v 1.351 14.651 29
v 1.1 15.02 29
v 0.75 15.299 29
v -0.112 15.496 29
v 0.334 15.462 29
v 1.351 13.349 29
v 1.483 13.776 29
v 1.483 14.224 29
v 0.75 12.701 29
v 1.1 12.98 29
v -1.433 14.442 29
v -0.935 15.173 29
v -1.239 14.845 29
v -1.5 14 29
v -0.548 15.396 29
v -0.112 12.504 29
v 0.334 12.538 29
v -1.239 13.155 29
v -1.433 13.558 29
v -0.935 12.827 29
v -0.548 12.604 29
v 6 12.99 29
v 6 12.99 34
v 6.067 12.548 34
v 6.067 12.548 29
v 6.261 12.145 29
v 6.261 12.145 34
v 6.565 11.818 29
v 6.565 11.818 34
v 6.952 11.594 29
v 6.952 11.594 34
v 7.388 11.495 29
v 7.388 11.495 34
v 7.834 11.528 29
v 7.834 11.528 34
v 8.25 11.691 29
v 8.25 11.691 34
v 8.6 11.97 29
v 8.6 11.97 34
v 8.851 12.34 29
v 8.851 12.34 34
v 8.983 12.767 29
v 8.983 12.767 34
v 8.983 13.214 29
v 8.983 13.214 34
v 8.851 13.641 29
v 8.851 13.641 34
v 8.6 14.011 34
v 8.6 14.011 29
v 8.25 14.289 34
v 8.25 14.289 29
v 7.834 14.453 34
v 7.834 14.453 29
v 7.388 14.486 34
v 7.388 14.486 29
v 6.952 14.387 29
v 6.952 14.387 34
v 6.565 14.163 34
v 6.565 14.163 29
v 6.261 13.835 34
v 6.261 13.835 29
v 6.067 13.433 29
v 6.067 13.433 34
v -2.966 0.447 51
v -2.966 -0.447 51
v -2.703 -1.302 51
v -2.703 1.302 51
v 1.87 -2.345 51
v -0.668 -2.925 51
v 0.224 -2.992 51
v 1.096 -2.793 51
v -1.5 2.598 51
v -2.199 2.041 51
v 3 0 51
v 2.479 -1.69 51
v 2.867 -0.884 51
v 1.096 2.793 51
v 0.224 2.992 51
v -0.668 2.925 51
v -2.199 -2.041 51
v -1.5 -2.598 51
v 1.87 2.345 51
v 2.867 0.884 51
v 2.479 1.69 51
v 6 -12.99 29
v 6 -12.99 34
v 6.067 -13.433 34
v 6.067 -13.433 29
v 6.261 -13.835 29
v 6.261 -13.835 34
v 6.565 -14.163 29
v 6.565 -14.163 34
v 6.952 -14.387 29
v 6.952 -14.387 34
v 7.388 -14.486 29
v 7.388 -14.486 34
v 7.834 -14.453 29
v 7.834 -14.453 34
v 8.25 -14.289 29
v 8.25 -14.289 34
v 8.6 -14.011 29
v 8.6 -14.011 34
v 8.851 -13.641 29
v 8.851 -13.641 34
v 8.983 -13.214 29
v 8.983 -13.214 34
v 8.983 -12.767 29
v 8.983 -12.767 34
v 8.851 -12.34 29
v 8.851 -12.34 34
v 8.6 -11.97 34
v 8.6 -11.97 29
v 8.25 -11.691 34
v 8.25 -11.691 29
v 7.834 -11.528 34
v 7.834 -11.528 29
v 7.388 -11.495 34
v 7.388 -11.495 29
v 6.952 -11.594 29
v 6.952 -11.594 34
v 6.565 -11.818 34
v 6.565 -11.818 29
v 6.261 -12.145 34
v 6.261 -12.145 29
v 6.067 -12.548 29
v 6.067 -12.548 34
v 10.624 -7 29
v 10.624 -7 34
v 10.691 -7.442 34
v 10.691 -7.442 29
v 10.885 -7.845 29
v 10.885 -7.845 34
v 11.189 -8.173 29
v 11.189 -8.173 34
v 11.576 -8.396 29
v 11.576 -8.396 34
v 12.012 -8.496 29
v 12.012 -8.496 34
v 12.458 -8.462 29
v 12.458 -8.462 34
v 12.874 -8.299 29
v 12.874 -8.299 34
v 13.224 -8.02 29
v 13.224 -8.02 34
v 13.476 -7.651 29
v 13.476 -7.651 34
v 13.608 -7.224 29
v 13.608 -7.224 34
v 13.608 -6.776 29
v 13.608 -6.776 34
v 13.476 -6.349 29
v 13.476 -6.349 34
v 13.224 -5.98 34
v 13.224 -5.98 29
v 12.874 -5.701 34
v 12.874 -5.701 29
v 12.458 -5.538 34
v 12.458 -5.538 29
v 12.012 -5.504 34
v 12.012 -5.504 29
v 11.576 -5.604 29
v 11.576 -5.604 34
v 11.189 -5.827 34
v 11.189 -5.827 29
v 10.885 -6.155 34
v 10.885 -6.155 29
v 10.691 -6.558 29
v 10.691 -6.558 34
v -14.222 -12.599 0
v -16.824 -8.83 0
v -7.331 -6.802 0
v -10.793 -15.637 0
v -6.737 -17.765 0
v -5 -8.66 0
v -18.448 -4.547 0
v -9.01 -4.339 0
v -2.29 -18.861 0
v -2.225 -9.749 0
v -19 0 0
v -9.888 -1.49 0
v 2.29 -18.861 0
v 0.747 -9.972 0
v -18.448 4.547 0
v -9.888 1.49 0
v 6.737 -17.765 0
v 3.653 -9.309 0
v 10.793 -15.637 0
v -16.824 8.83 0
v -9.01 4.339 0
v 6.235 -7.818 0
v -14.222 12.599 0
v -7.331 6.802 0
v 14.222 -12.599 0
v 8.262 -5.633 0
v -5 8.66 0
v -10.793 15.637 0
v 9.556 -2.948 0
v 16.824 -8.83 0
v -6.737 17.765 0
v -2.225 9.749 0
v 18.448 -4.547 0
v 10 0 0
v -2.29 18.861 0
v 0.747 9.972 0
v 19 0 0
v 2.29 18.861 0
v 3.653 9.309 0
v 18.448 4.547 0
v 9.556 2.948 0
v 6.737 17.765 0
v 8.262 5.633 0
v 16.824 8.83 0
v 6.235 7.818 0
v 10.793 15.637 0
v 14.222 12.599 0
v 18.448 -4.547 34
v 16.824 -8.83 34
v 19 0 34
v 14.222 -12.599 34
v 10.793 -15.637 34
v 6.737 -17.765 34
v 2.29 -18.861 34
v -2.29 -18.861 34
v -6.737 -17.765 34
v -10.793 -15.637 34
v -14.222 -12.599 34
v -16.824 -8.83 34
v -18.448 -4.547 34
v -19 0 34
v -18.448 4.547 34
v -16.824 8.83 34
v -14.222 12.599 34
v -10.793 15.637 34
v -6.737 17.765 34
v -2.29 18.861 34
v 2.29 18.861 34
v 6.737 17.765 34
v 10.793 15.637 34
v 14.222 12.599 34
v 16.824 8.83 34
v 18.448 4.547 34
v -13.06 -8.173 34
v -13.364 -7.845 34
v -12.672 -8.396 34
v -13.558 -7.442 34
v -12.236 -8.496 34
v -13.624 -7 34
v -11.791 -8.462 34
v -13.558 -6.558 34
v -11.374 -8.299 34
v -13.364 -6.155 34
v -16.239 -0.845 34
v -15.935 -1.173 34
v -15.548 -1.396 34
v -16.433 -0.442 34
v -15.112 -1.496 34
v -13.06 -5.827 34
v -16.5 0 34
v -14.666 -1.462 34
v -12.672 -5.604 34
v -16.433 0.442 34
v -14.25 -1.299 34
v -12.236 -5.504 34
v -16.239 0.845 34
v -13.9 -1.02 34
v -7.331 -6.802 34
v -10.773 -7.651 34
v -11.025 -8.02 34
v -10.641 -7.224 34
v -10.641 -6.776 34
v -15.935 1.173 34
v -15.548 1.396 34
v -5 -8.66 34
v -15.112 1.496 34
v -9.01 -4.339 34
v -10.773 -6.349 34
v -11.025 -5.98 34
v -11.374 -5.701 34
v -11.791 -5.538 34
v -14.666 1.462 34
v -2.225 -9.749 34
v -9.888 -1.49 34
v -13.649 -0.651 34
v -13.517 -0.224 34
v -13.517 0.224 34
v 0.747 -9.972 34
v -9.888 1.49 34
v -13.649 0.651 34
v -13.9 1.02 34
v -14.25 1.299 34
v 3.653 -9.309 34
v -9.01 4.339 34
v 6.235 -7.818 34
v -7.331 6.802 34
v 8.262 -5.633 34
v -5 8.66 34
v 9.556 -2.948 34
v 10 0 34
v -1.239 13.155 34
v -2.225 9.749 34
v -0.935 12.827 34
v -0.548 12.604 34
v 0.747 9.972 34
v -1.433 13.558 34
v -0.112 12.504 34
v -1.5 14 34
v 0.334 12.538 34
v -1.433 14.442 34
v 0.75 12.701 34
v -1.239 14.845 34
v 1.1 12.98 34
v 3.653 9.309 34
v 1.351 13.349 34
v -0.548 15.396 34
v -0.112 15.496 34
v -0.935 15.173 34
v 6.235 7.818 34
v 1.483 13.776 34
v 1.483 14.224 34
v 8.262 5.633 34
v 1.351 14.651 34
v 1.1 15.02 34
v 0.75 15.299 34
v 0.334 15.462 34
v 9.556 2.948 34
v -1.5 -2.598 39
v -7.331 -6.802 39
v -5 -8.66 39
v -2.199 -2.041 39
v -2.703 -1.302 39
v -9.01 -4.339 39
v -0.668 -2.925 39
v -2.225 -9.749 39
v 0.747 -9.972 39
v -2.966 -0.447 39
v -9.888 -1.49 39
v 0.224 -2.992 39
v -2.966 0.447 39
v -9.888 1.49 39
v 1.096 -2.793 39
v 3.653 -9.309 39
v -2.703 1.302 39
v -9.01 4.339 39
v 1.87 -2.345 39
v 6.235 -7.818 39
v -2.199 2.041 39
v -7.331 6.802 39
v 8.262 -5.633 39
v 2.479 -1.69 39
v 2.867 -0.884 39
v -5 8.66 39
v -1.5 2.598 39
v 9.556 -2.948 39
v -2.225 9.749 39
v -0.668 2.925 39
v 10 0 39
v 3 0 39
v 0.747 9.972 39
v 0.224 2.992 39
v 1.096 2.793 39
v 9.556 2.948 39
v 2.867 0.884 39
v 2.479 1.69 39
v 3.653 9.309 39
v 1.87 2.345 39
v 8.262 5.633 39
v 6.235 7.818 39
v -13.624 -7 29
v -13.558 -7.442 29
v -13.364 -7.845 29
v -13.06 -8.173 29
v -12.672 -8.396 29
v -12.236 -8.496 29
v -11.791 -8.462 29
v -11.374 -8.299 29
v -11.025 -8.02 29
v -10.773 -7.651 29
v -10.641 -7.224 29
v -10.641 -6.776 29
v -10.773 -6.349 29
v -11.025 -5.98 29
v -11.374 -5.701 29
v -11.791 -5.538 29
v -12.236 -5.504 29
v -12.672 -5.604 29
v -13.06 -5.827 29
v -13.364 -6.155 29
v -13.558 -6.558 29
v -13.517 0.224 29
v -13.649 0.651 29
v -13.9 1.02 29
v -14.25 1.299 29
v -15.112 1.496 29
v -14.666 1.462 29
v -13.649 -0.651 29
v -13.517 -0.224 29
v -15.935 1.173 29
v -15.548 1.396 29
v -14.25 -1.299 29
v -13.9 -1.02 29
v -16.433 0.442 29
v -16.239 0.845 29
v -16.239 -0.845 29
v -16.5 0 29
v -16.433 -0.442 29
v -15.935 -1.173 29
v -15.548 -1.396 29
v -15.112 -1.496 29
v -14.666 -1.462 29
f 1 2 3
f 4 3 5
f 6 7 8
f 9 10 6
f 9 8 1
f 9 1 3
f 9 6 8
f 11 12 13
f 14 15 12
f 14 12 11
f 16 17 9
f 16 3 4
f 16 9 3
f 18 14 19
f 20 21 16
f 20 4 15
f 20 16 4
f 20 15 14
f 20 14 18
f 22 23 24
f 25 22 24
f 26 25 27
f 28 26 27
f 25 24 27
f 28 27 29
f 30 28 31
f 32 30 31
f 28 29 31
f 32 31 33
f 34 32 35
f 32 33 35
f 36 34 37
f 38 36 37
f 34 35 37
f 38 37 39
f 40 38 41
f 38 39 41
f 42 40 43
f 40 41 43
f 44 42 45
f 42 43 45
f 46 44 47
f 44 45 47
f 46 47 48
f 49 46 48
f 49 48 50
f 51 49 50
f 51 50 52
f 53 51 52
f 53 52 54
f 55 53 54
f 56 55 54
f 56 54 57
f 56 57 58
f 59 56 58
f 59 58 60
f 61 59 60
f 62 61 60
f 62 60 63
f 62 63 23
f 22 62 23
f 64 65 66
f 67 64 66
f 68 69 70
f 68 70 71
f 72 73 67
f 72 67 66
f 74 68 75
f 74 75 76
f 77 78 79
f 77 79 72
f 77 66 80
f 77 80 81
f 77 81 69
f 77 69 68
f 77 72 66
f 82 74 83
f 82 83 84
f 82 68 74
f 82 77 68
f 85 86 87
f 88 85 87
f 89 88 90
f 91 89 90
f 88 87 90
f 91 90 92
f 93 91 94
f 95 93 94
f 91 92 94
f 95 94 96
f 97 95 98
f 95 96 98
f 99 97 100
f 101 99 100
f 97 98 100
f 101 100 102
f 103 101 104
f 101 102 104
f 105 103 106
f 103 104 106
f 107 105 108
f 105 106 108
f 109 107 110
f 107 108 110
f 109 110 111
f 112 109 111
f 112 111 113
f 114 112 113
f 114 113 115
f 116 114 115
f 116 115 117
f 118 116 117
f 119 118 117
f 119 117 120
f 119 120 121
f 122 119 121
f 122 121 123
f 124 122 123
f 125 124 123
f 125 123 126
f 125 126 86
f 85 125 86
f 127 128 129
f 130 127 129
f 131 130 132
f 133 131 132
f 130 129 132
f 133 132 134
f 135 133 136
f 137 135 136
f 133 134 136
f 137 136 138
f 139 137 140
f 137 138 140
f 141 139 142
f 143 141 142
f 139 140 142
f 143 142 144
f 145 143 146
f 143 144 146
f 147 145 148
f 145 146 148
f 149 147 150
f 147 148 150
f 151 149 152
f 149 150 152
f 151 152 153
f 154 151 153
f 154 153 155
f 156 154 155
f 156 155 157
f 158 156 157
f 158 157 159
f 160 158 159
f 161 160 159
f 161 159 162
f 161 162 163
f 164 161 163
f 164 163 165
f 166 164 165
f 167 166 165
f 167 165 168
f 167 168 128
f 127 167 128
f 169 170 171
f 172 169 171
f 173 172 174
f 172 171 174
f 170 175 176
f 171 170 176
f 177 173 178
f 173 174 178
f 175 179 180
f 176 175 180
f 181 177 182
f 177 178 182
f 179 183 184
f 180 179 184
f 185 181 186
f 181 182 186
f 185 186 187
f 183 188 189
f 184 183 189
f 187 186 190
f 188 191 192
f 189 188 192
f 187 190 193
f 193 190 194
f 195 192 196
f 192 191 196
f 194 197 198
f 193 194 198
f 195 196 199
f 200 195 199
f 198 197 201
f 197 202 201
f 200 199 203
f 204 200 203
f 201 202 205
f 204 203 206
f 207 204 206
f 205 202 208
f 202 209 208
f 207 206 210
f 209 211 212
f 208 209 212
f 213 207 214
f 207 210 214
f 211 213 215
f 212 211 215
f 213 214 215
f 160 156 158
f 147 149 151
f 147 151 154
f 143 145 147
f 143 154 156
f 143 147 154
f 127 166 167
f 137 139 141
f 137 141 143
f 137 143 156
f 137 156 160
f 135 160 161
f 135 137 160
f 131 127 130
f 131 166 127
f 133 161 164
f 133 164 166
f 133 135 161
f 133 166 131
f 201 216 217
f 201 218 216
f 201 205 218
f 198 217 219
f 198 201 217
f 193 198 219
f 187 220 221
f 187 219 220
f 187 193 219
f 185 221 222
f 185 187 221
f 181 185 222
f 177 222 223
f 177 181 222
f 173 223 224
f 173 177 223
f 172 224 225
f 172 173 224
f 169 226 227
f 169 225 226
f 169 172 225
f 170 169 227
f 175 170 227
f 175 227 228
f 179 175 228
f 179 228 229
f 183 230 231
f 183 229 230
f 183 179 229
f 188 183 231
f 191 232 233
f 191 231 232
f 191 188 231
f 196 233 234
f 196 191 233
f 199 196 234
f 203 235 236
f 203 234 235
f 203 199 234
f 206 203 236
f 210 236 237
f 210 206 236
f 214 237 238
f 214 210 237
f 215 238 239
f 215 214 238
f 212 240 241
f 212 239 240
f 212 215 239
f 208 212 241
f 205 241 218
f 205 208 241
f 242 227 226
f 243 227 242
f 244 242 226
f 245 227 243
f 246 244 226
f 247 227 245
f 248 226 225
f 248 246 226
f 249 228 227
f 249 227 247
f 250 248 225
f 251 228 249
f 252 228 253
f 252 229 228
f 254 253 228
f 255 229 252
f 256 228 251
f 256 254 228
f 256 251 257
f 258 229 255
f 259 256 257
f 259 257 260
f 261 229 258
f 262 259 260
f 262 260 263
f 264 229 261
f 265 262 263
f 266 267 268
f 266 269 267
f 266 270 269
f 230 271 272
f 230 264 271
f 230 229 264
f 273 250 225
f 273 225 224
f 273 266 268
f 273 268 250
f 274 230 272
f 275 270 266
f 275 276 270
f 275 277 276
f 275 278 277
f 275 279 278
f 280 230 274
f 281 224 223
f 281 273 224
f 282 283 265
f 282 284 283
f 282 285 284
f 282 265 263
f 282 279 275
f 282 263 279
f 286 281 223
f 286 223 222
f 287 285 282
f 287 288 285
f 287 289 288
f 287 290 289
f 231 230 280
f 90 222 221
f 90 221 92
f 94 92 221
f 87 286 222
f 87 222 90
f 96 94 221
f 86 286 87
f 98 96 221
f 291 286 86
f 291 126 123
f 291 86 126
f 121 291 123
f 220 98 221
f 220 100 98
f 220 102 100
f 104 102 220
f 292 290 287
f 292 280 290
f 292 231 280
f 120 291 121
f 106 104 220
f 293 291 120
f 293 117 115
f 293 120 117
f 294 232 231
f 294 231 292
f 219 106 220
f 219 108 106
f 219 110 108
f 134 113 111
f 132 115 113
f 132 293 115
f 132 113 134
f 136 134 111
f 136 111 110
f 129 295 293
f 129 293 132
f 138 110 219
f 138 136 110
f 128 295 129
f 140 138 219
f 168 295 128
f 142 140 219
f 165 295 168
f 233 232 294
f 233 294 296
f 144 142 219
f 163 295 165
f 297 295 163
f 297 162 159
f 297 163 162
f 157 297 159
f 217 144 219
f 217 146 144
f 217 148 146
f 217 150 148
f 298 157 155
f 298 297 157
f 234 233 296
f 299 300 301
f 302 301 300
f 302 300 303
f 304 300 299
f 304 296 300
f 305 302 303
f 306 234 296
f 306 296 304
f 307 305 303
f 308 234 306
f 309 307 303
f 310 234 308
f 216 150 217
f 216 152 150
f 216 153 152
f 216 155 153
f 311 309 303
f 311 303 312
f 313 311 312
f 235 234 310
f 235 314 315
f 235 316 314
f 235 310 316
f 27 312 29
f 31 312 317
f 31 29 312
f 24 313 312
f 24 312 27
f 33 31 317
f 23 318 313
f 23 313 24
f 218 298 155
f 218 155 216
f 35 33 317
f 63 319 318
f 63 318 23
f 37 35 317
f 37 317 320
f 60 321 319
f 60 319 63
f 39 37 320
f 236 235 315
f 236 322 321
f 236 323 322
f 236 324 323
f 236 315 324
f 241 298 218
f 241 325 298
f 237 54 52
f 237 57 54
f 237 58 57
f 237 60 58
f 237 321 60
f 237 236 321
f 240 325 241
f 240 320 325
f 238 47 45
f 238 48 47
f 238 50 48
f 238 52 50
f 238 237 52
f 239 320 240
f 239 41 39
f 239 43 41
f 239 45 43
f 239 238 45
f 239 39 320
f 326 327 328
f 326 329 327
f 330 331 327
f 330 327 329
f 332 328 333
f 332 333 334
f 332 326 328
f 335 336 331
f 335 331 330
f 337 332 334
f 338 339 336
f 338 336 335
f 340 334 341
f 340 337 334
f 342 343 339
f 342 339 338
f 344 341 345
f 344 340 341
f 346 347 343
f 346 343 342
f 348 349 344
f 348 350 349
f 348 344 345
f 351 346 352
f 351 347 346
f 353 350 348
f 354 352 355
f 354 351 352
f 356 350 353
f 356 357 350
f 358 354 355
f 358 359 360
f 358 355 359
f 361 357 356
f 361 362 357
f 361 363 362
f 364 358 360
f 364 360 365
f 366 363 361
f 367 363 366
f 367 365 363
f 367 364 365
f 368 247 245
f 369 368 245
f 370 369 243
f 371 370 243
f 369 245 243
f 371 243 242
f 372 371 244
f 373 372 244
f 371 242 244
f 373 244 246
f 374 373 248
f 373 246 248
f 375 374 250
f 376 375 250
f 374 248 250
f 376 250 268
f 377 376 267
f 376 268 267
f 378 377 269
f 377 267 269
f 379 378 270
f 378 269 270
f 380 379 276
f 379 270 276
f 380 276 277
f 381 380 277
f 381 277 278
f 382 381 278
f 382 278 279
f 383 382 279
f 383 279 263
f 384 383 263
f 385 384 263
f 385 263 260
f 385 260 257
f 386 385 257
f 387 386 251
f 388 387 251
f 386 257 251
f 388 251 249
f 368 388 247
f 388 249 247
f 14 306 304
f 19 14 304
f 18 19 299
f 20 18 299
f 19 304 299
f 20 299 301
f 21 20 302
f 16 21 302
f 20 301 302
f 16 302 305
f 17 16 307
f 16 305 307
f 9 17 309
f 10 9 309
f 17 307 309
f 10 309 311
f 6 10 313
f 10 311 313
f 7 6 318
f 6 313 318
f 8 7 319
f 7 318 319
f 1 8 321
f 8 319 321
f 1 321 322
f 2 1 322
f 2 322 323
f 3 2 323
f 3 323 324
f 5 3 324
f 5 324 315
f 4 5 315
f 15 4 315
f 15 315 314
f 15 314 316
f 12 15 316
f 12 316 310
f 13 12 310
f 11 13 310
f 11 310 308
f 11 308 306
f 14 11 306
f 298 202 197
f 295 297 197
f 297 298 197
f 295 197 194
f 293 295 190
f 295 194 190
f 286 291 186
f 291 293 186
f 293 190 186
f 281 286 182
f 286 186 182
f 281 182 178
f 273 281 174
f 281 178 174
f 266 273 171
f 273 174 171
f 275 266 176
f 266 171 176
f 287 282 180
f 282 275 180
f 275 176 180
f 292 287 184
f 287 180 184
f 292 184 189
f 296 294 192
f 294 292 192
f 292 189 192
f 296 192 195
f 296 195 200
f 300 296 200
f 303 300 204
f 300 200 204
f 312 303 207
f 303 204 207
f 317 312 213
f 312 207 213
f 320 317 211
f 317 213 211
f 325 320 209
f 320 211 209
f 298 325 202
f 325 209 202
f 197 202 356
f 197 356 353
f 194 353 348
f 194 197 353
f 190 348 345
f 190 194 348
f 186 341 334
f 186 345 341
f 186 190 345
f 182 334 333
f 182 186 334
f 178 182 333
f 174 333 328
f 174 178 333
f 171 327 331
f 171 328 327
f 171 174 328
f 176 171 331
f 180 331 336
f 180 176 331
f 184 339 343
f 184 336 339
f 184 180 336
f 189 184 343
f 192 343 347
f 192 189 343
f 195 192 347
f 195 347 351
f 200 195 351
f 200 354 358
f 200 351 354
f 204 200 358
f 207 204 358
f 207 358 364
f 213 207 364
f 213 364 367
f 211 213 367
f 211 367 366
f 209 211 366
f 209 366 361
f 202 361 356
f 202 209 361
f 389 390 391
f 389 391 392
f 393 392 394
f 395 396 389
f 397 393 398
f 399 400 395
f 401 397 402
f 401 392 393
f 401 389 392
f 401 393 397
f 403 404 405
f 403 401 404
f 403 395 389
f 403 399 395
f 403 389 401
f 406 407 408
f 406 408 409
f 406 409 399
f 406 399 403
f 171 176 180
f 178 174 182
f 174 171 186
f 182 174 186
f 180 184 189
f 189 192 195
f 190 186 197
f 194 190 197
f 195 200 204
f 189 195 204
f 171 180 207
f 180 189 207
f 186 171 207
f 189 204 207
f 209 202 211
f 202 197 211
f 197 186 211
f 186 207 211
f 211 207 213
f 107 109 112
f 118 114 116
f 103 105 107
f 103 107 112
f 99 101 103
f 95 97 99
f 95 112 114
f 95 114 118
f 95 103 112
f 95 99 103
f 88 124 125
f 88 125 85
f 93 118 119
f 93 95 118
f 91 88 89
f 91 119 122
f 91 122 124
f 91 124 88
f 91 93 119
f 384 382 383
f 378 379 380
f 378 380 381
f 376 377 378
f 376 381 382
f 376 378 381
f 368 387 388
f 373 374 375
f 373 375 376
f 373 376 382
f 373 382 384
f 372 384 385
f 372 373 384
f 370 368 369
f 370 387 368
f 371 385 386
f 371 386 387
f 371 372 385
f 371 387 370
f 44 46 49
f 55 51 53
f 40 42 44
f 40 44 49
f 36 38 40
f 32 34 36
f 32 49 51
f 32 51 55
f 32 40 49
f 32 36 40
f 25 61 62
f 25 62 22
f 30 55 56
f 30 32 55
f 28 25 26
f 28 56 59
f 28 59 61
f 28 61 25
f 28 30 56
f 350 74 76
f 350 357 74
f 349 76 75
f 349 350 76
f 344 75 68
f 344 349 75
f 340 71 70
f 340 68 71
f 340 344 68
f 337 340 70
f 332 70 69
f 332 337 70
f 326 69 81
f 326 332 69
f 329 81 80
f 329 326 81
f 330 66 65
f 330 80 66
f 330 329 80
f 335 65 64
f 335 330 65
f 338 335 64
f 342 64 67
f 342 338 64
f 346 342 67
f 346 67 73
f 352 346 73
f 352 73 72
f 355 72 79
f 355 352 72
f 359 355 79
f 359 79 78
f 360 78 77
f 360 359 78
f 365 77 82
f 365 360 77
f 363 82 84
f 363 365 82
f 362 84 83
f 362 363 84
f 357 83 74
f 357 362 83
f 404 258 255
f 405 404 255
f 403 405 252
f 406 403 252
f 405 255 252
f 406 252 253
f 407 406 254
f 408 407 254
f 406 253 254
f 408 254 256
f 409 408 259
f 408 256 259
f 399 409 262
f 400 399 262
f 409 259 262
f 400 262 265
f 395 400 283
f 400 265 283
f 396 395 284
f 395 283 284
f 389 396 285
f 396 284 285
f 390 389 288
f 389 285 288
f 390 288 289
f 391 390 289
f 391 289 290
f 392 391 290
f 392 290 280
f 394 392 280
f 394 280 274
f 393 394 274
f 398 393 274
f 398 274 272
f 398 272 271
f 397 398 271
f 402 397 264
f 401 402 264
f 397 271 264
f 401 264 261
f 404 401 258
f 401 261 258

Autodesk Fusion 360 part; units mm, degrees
sketch "Skizze1" plane through (0, 0, 0) normal (0, 0, 1) x (1, 0, 0)
  circle A0 centre (0, 0) radius 19
  circle A1 centre (0, 0) radius 10
  circle A2 centre (0, 0) radius 3
  dimension "d1" = 38
  dimension "d2" = 20
  dimension "d3" = 6
extrude "Extrusion3" add sketch "Skizze1" along normal blind 39 contours A2 makes body 1
extrude "Extrusion2" add sketch "Skizze1" along normal blind 39 separate body contours A1 makes body 2
extrude "Extrusion1" add sketch "Skizze1" along normal blind 34 separate body contours A0 makes body 3
extrude "Extrusion4" add 1 faces at (0.3505, -0.866, 39) along direction (0, 0, 1) blind 12 on bodies 1 bodies 1 3 2
sketch "Skizze2" plane through (0, 0, 34) normal (0, 0, 1) x (-1, 0, 0)
  circle A0 centre (0, 0) radius 10
  circle A1 centre (0, 0) radius 19
  line L0 (0, 0) -> (0, -14) construction
  line L1 (0, 0) -> (-7.5, -12.9904) construction
  line L2 (0, 0) -> (12.3693, 0) construction
  line L3 (0, 0) -> (15, 0) construction
  line L4 (0, 0) -> (12.1244, 7) construction
  line L5 (0, 0) -> (12.6491, 0) construction
  circle A2 centre (15, 0) radius 1.5
  circle A3 centre (12.1244, 7) radius 1.5
  circle A4 centre (0, -14) radius 1.5
  circle A5 centre (-7.5, -12.9904) radius 1.5
  line L6 (0, 0) -> (-12.1244, 7) construction
  line L7 (0, 0) -> (11.7072, 0) construction
  line L8 (0, 0) -> (-7.5, 12.9904) construction
  line L9 (0, 0) -> (13.6015, 0) construction
  circle A6 centre (-12.1244, 7) radius 1.5
  circle A7 centre (-7.5, 12.9904) radius 1.5
  dimension "d12" = 14
  dimension "d13" = 120
  dimension "d14" = 15
  dimension "d15" = 15
  dimension "d16" = 30
  dimension "d17" = 14
  dimension "d18" = 3
  dimension "d19" = 3
  dimension "d20" = 3
  dimension "d21" = 3
  dimension "d22" = 150
  dimension "d23" = 14
  dimension "d24" = 120
  dimension "d25" = 15
  dimension "d26" = 3
  dimension "d27" = 3
extrude "Extrusion6" cut sketch "Skizze2" against normal blind 5 contours A5 bodies 3
extrude "Extrusion5" cut sketch "Skizze2" against normal blind 5 contours A4 bodies 3
extrude "Extrusion7" cut sketch "Skizze2" against normal blind 5 contours A6 bodies 3
extrude "Extrusion8" cut sketch "Skizze2" against normal blind 5 contours A7 bodies 3
extrude "Extrusion9" cut sketch "Skizze2" against normal blind 5 contours A3 bodies 3
extrude "Extrusion10" cut sketch "Skizze2" against normal blind 5 contours A2 bodies 3
